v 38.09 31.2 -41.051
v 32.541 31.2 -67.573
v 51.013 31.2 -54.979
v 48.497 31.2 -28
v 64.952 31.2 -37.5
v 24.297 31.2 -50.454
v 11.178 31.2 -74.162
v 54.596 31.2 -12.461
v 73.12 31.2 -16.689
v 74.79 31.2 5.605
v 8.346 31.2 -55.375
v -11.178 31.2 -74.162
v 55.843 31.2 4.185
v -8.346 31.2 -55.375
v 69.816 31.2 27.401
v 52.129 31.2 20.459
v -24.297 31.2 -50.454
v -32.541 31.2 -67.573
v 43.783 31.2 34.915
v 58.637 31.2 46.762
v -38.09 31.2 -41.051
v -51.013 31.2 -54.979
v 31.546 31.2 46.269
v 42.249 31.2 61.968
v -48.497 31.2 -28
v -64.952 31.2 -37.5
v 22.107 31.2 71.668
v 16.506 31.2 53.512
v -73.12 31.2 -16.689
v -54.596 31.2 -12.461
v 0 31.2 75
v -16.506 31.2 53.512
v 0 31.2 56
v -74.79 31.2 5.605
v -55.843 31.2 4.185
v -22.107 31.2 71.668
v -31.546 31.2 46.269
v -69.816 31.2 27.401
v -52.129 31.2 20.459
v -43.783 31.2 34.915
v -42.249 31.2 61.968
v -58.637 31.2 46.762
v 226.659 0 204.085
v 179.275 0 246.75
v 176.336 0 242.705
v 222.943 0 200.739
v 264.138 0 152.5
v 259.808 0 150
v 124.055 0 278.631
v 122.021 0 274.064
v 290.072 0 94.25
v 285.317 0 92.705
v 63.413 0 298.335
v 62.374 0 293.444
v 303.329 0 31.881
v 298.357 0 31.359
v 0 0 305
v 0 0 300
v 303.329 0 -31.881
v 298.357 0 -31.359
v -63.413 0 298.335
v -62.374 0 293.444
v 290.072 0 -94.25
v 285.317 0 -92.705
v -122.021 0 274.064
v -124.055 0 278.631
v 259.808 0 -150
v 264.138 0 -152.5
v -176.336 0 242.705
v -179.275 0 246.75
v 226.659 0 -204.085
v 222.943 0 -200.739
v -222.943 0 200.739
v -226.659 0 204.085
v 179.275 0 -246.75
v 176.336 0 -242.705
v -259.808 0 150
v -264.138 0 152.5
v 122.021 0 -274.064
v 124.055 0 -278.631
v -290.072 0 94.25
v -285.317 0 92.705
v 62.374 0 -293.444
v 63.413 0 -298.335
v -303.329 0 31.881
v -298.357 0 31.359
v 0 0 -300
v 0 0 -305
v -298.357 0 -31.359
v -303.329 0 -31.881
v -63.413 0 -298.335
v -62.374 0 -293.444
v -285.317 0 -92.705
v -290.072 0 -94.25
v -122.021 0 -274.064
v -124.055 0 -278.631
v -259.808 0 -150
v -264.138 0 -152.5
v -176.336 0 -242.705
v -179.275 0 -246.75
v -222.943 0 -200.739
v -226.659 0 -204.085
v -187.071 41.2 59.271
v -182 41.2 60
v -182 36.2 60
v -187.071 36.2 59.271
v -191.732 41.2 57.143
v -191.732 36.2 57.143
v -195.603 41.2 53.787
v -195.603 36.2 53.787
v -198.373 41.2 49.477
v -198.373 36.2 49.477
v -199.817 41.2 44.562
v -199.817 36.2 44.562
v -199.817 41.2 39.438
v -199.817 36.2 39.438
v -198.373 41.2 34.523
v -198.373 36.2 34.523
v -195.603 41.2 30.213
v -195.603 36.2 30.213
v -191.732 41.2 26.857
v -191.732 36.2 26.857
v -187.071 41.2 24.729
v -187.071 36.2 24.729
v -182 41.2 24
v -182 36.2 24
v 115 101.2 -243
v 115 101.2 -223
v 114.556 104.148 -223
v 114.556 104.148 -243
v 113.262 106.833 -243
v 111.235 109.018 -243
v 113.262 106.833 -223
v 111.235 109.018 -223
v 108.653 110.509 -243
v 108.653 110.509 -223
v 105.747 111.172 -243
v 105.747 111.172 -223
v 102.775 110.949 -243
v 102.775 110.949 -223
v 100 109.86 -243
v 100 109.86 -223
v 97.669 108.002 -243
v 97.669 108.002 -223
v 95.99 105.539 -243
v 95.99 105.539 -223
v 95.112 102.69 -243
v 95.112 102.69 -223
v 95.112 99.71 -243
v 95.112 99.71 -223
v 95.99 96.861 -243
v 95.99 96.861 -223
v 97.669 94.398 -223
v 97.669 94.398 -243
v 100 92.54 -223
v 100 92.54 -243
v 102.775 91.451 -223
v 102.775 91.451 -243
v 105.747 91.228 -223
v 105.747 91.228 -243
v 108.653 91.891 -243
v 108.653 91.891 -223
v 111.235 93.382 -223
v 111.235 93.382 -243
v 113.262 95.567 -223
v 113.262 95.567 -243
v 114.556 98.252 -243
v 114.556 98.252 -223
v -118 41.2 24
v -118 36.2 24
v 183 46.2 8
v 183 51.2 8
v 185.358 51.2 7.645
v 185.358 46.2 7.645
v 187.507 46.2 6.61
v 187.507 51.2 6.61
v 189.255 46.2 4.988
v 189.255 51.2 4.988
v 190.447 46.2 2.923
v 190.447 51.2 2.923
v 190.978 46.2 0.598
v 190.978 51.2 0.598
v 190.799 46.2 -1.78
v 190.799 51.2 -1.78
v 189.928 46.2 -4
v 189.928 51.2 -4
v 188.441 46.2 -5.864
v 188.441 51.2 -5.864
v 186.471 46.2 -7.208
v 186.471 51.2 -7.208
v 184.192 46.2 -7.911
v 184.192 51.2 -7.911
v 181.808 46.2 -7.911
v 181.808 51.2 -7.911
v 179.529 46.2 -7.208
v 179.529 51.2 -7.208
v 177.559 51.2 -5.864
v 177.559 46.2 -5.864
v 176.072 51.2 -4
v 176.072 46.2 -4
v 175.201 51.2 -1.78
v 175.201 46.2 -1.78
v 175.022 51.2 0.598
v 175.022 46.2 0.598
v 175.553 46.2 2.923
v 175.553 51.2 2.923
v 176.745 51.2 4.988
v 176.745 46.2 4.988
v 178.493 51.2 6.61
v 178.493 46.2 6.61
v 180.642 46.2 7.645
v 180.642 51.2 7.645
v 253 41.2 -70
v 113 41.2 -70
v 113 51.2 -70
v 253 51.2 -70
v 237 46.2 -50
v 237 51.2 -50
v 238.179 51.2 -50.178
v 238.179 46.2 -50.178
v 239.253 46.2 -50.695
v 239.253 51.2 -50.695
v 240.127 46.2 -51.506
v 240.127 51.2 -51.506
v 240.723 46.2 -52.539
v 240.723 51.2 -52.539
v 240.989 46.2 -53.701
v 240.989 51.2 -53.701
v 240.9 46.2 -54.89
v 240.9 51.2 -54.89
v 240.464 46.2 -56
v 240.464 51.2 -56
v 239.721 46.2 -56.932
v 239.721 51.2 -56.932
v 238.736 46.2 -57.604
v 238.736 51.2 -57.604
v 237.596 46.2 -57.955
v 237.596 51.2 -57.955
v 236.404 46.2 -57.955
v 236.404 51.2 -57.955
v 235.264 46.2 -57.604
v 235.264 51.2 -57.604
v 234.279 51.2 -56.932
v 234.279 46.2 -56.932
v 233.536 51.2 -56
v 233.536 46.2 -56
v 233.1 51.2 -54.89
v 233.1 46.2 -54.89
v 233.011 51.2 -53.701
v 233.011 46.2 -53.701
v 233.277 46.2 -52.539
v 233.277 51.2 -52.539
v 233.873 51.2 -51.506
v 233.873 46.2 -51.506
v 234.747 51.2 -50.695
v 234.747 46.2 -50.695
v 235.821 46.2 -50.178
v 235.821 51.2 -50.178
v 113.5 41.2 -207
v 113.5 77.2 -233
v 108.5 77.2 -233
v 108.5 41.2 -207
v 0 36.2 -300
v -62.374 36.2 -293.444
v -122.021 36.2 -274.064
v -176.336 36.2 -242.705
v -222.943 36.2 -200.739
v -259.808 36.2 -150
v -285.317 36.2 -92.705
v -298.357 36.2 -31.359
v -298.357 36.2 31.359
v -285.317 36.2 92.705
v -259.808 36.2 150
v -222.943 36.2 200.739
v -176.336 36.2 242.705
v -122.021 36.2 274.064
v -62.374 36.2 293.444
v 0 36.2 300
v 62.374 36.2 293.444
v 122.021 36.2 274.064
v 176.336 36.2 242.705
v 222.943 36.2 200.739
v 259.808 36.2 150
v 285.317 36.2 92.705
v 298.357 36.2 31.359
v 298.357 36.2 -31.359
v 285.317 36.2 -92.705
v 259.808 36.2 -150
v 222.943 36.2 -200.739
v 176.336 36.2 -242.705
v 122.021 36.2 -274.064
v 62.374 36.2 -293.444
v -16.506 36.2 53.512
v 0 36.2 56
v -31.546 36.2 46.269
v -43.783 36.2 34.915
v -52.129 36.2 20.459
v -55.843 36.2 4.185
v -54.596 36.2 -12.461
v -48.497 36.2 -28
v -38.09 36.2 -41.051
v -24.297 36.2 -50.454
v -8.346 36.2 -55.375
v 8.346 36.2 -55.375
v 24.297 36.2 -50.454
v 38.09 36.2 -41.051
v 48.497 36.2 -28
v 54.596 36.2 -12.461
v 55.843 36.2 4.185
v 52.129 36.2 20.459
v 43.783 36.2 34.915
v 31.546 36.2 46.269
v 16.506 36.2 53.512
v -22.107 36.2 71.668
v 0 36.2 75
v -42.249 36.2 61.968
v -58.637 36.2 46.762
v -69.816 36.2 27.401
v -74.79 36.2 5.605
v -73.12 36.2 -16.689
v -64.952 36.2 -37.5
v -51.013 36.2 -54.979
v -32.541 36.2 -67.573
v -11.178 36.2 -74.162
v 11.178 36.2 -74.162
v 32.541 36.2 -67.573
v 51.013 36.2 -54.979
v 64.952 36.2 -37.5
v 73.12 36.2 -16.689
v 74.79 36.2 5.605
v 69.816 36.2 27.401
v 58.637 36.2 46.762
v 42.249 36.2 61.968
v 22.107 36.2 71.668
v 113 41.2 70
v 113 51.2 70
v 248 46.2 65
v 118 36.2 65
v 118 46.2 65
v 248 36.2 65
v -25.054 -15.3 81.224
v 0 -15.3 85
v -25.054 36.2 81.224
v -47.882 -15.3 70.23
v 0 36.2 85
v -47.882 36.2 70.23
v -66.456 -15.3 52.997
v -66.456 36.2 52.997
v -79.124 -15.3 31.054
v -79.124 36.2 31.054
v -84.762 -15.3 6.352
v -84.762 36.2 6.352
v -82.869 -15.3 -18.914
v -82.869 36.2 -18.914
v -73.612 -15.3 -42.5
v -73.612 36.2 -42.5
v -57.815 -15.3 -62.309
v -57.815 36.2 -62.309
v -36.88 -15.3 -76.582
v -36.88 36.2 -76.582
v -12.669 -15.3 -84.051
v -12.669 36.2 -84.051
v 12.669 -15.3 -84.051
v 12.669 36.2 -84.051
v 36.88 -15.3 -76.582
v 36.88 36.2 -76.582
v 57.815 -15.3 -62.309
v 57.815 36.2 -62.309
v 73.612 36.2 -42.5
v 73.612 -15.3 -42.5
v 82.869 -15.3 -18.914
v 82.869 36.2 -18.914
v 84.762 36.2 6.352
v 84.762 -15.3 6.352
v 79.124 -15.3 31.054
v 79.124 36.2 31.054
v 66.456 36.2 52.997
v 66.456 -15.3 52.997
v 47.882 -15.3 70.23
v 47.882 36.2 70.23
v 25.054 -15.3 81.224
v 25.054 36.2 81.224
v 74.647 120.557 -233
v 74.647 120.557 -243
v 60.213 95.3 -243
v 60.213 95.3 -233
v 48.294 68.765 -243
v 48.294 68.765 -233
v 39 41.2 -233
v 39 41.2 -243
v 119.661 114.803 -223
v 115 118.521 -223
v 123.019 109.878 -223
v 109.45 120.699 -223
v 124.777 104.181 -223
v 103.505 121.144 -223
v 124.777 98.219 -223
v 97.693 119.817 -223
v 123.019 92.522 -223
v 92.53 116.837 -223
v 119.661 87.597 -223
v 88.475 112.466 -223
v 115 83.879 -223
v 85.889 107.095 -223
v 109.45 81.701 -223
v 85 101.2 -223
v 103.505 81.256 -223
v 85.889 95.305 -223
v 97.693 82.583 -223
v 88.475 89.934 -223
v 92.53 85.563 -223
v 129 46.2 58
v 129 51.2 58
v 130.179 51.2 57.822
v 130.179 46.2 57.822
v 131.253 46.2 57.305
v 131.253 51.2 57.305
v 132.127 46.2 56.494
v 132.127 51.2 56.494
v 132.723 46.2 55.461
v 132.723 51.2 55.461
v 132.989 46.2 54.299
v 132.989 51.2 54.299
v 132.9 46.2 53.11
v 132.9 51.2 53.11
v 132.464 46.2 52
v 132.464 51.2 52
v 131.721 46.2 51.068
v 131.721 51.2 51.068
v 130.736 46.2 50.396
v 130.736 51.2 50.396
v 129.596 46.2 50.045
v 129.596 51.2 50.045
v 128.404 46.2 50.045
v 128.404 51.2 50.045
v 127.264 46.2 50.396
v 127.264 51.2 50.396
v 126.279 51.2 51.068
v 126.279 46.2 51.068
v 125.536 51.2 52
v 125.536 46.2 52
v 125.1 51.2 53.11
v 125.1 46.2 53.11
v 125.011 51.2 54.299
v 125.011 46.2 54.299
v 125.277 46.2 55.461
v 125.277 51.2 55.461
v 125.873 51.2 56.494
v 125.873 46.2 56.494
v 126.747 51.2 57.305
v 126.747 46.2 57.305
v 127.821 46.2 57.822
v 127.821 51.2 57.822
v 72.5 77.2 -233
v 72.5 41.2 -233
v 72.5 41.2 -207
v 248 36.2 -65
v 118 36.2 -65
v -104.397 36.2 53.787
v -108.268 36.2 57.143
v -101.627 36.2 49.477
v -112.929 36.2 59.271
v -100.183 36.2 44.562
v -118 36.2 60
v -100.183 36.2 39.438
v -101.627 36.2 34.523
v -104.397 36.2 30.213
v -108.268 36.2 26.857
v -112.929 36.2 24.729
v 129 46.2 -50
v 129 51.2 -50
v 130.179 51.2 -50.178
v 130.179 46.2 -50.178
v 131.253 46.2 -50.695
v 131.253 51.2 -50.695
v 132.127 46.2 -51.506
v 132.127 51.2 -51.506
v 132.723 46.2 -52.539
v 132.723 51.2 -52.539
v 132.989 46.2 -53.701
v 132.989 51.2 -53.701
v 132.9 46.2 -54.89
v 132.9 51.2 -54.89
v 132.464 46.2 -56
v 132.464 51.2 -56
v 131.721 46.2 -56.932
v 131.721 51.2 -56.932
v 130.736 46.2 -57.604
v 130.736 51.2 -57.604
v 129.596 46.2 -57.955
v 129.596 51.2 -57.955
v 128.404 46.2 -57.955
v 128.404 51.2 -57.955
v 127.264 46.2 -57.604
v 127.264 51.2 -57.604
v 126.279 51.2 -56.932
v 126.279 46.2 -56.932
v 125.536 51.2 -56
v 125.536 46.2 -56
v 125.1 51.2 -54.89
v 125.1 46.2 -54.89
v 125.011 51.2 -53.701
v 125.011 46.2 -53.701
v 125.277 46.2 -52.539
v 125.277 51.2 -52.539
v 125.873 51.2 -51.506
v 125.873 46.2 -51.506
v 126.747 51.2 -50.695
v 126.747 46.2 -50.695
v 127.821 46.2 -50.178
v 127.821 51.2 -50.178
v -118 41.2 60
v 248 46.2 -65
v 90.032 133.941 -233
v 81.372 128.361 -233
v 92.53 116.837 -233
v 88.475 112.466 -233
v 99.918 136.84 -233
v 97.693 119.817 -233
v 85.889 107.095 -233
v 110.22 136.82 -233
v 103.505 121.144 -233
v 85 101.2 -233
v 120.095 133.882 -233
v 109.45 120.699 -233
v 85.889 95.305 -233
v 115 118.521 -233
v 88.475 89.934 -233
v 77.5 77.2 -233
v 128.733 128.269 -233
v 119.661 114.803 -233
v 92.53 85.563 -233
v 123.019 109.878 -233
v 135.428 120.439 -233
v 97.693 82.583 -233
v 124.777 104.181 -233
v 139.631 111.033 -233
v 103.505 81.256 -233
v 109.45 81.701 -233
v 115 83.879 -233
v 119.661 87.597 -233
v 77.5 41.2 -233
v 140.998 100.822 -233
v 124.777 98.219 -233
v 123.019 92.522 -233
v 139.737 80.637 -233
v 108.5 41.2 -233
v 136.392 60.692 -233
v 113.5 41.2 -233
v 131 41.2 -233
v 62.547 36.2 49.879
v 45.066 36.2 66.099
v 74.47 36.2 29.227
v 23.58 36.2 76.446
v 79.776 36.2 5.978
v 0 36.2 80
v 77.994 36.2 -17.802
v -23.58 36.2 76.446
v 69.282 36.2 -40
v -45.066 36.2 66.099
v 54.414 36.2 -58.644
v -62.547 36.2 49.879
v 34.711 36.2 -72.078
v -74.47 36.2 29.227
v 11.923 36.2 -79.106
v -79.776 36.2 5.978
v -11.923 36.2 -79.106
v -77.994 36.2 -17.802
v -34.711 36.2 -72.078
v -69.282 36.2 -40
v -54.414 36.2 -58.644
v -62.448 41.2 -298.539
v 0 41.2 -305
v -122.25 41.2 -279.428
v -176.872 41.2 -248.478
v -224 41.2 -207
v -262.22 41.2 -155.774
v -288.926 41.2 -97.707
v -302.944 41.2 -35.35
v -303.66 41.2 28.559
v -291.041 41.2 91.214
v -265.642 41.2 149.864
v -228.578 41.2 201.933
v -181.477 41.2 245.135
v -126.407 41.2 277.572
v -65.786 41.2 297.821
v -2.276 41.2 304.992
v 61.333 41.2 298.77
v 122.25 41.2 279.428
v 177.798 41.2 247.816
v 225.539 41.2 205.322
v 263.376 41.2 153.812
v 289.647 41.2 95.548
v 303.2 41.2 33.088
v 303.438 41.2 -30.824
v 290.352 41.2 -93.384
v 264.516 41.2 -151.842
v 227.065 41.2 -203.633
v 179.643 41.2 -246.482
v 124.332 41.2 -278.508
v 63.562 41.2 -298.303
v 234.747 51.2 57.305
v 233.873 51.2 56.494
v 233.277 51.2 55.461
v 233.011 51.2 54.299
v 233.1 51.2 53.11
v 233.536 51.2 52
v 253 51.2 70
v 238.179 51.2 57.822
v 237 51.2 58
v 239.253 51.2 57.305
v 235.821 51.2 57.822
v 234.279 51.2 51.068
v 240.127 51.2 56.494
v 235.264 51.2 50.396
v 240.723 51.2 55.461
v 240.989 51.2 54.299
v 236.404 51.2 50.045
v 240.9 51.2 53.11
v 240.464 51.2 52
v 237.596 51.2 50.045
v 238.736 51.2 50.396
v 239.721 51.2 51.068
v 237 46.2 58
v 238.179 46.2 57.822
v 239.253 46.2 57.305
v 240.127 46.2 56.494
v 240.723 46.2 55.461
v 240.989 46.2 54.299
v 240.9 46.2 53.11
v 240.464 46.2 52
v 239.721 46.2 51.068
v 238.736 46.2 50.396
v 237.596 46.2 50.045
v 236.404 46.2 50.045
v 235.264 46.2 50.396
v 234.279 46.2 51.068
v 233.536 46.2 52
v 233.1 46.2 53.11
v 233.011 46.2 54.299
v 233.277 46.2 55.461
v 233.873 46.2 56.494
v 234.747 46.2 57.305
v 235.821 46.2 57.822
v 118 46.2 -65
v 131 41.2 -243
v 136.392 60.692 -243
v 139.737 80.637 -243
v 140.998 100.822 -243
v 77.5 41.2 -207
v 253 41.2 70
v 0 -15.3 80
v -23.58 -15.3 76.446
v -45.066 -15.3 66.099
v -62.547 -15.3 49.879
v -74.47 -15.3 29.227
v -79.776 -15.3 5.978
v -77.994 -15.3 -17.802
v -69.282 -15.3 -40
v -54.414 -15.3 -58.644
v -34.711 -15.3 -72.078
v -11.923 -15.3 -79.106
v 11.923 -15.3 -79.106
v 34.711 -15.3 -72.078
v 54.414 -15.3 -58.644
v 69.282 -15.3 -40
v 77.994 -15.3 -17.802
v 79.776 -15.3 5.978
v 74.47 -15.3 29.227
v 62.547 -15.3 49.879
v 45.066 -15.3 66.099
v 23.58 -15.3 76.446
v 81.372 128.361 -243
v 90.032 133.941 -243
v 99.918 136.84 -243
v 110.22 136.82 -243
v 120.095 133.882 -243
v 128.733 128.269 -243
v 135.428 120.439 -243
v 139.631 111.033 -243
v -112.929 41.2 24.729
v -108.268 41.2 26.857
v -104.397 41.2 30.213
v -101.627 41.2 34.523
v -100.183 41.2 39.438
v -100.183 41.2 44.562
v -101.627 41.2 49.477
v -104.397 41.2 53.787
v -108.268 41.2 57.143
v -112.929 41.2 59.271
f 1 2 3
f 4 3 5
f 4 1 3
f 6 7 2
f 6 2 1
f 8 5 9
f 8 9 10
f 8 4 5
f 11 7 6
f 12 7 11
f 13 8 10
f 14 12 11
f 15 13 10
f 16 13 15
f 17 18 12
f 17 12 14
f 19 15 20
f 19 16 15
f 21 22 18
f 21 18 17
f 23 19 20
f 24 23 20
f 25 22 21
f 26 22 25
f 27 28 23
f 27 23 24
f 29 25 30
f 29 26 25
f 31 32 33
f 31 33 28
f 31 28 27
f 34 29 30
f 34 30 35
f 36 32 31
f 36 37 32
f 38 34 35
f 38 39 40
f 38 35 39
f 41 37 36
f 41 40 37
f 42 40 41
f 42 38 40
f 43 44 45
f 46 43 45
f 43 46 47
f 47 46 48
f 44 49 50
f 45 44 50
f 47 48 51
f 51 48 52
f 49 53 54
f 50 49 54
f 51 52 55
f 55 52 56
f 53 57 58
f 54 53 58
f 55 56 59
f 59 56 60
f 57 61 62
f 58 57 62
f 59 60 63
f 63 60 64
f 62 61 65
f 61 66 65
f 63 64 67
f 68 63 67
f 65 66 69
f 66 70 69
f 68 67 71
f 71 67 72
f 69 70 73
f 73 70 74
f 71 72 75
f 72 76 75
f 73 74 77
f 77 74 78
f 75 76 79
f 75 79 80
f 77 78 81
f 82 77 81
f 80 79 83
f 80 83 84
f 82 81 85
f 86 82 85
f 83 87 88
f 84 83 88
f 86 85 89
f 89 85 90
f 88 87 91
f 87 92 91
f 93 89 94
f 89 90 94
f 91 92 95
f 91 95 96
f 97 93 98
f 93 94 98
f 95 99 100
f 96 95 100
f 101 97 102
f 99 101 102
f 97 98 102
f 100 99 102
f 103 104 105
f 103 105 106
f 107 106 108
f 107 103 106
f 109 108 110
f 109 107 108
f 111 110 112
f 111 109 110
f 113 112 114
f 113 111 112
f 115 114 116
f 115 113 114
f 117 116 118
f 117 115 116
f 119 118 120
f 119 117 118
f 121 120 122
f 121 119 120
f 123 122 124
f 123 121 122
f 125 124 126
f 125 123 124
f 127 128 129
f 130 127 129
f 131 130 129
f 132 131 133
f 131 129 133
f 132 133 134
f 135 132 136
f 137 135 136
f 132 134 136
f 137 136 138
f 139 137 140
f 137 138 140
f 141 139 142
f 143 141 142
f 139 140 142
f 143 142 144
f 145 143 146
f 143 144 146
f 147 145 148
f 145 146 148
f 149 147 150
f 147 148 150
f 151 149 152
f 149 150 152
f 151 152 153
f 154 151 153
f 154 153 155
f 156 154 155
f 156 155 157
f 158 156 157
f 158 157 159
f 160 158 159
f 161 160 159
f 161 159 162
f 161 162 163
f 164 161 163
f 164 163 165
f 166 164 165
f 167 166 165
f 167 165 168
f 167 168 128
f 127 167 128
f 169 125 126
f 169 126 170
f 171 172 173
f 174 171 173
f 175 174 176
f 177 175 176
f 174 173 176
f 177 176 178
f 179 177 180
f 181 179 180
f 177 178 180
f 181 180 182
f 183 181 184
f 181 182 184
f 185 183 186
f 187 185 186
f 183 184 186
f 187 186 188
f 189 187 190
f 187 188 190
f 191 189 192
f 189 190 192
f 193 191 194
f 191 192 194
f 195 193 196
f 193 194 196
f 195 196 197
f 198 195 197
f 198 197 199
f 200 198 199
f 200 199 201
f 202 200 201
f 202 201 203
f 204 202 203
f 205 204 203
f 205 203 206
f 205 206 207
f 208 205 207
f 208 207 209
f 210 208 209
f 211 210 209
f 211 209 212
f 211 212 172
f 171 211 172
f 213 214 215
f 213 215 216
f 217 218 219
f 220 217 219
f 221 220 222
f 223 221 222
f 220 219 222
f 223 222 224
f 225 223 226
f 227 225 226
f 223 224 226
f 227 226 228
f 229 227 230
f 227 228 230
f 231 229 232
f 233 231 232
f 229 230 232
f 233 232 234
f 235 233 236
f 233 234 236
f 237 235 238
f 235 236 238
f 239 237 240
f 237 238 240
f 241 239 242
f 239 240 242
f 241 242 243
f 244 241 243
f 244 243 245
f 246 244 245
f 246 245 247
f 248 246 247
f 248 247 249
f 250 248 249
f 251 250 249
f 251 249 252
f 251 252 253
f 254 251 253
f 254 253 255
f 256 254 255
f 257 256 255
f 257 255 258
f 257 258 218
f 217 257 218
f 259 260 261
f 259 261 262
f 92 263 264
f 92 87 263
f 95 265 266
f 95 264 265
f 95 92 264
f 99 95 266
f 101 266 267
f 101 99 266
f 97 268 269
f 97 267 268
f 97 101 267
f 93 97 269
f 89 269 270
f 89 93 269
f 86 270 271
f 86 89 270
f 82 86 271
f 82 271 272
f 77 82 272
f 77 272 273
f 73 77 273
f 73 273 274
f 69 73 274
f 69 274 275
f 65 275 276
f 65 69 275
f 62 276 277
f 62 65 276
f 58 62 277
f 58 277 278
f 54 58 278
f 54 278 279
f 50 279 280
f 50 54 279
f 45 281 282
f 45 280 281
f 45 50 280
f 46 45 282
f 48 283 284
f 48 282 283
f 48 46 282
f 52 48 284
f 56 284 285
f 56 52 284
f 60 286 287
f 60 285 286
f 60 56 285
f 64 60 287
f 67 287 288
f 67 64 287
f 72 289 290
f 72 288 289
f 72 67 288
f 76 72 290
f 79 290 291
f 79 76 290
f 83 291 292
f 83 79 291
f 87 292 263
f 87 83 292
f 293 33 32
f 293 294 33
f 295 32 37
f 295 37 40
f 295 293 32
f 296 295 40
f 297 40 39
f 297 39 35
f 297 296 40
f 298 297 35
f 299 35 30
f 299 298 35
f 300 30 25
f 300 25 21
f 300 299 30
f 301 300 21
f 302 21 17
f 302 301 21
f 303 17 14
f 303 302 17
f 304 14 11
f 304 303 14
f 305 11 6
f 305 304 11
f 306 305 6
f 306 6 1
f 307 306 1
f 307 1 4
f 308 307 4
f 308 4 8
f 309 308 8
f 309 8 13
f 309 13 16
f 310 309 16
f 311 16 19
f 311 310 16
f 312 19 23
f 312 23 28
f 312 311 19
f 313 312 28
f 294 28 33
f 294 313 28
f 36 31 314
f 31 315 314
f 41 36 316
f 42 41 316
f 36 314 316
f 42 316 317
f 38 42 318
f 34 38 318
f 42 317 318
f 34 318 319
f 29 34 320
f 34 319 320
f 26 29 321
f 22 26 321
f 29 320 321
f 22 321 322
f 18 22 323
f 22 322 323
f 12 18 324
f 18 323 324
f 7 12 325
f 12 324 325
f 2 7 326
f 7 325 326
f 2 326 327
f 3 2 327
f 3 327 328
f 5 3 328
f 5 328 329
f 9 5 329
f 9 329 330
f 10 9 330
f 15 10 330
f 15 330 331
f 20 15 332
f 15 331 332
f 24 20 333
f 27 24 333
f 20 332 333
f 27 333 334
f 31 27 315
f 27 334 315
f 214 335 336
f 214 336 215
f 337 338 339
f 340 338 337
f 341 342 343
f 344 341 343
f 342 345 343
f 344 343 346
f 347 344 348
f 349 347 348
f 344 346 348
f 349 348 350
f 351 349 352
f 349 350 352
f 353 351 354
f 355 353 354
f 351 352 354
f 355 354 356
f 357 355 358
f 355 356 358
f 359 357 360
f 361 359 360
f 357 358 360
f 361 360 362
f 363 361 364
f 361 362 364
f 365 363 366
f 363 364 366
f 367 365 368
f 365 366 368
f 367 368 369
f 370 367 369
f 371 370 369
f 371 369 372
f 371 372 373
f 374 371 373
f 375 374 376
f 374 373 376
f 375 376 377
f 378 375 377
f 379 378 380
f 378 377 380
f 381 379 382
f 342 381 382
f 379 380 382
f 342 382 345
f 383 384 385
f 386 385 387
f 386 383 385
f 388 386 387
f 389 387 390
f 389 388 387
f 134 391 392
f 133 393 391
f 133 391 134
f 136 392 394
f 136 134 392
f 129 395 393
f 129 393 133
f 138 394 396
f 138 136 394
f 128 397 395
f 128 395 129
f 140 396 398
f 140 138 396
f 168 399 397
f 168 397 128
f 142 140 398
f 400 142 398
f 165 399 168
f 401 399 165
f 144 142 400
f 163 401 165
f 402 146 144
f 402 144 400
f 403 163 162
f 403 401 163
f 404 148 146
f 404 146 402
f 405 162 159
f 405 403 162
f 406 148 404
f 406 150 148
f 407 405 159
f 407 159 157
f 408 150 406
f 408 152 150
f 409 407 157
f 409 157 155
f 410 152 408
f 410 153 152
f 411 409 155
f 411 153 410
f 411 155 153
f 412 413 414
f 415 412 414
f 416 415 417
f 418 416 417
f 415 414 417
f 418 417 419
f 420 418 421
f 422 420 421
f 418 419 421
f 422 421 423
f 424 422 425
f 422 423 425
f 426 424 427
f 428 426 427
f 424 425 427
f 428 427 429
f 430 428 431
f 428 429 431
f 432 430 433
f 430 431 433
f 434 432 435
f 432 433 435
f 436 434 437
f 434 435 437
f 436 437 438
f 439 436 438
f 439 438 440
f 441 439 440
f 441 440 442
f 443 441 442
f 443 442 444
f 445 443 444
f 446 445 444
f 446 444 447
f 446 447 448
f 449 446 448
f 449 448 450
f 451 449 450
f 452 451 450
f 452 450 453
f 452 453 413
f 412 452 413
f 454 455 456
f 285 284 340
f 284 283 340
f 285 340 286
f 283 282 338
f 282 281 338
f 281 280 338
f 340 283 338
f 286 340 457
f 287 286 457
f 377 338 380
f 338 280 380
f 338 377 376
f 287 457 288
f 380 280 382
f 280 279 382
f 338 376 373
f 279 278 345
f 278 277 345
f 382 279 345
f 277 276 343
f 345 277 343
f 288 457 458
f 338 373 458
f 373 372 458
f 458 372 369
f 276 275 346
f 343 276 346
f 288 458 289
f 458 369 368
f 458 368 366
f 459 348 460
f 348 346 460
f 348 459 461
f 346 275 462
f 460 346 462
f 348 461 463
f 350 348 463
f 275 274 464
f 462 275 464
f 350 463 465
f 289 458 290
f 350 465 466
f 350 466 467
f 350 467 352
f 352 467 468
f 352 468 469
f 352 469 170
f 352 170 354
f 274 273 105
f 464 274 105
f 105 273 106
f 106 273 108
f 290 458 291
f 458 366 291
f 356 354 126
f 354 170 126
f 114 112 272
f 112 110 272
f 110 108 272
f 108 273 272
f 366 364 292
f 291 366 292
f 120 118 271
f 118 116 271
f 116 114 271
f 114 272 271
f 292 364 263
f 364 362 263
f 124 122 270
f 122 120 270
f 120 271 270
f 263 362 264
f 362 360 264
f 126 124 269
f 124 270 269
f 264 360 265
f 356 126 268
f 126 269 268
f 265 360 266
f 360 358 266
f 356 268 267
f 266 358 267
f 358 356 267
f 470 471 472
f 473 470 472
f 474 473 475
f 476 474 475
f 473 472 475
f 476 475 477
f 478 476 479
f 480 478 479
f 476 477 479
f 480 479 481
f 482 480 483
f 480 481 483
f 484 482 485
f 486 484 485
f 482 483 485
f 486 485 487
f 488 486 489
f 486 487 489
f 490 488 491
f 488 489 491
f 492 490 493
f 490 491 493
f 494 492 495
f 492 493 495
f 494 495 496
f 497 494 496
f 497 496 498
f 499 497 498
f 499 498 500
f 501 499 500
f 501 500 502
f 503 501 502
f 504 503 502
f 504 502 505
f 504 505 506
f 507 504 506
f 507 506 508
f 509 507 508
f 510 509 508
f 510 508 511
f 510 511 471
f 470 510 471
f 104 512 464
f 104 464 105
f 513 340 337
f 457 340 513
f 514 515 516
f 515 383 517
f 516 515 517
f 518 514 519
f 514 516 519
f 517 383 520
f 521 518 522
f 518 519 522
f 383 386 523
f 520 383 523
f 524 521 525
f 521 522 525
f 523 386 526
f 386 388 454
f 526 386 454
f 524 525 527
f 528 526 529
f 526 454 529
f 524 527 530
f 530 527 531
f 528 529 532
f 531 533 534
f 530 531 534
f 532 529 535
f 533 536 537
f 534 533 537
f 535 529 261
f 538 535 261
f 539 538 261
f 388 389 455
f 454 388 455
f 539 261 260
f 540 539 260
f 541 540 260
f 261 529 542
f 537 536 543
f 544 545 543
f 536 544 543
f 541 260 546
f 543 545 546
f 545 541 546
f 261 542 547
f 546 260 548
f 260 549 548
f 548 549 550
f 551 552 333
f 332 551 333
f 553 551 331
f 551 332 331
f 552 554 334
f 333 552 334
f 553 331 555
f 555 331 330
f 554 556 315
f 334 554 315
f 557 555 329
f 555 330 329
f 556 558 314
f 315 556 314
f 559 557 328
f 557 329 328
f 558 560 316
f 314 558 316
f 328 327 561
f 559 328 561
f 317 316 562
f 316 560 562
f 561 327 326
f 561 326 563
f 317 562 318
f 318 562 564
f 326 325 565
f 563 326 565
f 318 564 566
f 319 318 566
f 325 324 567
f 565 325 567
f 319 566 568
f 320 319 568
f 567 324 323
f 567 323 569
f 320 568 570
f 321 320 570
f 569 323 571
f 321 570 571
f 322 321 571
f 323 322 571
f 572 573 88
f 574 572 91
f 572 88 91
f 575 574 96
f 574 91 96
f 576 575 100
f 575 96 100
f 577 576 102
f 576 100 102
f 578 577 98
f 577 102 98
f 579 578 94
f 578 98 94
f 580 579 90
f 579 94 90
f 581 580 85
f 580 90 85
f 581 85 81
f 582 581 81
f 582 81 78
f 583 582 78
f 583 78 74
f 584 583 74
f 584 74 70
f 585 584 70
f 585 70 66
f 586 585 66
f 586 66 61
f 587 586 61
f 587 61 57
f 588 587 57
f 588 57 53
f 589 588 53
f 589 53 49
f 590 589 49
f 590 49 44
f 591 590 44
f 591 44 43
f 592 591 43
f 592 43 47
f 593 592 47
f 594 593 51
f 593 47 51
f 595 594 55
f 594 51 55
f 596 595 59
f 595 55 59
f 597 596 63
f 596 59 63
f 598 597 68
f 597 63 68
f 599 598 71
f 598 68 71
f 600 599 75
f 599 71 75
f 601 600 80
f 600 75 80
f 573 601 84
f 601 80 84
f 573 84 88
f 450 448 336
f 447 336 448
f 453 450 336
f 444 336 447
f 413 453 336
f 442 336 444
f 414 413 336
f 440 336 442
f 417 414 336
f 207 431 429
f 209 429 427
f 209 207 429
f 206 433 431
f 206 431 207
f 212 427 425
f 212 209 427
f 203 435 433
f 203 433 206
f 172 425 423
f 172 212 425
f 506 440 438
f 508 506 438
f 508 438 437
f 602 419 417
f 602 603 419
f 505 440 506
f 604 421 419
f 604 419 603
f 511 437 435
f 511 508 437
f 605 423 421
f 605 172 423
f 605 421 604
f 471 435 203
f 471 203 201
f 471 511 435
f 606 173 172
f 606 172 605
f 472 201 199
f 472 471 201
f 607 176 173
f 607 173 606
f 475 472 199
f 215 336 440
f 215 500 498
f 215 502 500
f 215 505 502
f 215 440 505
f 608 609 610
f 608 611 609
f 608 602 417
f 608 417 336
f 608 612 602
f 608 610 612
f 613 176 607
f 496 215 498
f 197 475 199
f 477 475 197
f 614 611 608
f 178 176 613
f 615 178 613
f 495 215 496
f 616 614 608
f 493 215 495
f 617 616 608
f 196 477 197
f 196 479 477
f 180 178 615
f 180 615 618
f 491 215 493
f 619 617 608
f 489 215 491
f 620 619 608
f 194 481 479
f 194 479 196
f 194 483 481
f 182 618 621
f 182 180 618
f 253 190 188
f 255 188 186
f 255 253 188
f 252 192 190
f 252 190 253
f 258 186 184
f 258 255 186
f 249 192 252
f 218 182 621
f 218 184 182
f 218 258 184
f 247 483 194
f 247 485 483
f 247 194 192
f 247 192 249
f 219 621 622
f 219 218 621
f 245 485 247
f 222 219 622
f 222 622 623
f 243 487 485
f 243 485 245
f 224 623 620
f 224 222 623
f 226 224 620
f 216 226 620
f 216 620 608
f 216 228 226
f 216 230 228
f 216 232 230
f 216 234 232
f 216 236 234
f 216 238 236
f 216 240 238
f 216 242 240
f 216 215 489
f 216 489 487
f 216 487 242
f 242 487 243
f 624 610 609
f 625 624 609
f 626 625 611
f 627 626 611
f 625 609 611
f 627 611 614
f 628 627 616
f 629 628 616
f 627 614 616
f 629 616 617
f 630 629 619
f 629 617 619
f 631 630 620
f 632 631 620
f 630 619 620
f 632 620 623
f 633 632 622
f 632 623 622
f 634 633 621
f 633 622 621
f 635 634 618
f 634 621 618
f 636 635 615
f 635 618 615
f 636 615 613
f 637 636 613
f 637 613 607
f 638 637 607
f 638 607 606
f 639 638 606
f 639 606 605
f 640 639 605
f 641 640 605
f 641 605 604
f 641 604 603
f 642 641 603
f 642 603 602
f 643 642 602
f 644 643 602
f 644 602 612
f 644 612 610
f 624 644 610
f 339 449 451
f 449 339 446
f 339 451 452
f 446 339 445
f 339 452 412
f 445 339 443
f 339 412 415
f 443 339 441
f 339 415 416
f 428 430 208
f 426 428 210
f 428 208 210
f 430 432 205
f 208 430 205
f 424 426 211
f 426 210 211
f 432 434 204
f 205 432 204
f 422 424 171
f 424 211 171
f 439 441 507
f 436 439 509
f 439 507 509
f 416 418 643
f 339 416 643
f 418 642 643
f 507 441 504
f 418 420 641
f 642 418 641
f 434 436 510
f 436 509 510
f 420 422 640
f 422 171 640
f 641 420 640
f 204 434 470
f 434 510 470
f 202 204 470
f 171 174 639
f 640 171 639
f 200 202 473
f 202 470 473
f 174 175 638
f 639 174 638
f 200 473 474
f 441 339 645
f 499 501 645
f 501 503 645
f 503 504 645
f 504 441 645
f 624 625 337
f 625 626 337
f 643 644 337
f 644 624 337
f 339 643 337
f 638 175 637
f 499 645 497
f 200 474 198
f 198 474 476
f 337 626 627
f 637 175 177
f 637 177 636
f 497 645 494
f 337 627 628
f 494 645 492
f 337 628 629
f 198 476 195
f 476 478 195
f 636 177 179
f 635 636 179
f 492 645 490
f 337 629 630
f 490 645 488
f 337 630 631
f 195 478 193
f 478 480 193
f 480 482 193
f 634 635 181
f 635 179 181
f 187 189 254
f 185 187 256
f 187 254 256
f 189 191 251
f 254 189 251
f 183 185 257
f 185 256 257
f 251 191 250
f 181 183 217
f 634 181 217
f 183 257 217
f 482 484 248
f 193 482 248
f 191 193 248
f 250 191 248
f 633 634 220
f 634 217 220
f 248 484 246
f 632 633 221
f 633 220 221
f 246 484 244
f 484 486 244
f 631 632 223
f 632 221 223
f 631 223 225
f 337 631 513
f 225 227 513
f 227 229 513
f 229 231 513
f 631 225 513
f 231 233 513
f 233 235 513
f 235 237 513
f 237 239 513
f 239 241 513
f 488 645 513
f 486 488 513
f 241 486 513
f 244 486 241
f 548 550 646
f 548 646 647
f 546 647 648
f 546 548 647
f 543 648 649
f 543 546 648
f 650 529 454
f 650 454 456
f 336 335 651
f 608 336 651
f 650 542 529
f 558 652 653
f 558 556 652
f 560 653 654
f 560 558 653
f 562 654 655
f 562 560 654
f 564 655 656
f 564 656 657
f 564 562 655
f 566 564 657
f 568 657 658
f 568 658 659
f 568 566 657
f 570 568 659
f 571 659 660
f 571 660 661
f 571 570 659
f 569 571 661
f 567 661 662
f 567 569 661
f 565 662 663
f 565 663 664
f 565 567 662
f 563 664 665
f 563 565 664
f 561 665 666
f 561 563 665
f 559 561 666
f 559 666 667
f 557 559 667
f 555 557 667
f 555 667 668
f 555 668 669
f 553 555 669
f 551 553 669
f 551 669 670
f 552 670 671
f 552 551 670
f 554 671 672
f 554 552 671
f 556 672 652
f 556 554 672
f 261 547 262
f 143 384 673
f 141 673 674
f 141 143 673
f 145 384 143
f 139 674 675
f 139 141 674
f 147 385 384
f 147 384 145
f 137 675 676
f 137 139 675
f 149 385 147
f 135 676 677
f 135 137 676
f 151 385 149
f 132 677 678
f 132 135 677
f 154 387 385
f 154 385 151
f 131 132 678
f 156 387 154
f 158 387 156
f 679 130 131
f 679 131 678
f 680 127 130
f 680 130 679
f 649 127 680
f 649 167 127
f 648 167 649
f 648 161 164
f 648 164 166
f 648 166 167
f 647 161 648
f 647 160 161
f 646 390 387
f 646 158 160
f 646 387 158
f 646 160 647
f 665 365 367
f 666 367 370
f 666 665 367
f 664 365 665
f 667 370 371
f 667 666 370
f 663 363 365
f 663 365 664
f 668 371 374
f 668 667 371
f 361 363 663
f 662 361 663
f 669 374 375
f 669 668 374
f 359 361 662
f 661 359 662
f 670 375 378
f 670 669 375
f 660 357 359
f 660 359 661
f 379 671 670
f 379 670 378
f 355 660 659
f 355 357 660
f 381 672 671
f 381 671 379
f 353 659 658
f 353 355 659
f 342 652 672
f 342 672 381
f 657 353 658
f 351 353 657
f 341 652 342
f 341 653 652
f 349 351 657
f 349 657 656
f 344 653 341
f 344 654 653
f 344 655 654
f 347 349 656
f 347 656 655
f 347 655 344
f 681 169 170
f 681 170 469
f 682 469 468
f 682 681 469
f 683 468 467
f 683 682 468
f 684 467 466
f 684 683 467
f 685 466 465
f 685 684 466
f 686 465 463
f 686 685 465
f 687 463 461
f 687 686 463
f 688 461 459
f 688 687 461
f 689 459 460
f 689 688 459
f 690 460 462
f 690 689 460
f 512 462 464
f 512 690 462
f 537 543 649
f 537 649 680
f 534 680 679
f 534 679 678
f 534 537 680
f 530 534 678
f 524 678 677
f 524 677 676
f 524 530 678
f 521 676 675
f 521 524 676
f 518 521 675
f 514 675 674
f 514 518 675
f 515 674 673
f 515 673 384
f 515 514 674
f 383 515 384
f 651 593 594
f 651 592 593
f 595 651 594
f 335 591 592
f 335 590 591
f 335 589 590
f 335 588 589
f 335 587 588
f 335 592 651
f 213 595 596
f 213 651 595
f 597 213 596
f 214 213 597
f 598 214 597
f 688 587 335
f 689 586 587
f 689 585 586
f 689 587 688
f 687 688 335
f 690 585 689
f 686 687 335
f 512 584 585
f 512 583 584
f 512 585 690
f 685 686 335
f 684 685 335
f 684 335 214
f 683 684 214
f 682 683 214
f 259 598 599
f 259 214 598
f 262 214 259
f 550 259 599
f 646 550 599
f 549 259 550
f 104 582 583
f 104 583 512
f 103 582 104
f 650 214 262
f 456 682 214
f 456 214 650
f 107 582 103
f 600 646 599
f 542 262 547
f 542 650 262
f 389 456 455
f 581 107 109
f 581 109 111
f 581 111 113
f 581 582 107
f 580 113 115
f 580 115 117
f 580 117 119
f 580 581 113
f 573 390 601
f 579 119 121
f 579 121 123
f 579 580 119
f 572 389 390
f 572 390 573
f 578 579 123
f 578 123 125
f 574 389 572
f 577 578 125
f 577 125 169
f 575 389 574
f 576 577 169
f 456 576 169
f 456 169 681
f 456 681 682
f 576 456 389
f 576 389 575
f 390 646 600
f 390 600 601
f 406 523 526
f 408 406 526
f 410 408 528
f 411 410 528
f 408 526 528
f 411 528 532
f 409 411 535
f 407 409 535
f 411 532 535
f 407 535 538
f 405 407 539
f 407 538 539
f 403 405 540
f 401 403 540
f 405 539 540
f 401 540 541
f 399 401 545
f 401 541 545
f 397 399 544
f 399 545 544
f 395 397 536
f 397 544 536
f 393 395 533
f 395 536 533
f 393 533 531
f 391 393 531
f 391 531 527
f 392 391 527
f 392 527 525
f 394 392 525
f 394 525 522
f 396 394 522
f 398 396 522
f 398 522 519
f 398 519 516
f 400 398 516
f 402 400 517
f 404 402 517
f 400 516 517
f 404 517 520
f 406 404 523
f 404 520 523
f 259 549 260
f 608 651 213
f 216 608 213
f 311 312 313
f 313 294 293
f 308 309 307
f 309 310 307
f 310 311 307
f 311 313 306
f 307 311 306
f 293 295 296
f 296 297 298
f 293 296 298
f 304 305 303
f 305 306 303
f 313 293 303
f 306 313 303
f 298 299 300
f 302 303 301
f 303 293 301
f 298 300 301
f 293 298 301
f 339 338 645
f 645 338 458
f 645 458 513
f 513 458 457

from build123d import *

# Parameters (mm, degrees)
SKETCH_1_R           = 305
EXTRUDE_1_DEPTH      = 41.2
SKETCH_4_W           = 140
SKETCH_4_H           = 140
EXTRUDE_2_DEPTH      = 10
SHELL_1_T            = -5
CUT_EXTRUDE_3_DEPTH  = 434.298326791
SKETCH_5_R           = 8
SKETCH_5_R_2         = 4
CUT_EXTRUDE_6_DEPTH  = 435.363258115
SKETCH_11_W          = 130
SKETCH_11_H          = 10
EXTRUDE_3_DEPTH      = 200
CUT_EXTRUDE_8_DEPTH  = 664.812051713
SKETCH_14_R          = 20
EXTRUDE_4_DEPTH      = 10
SKETCH_16_R          = 10
CUT_EXTRUDE_10_DEPTH = 626.006271969
SKETCH_19_W          = 5
SKETCH_19_H          = 36
EXTRUDE_5_DEPTH      = 26
CUT_EXTRUDE_11_DEPTH = 536.715493522
SKETCH_21_W          = 19
SKETCH_21_H          = 5
SKETCH_21_W_2        = 5
SKETCH_21_H_2        = 51.5


with BuildPart() as part:
    # 草图1 → 凸台-拉伸1 (new body)
    with BuildSketch(Plane(origin=(0, 0, 0), x_dir=(1, 0, 0), z_dir=(0, 1, 0))):
        with Locations(Location((0, 0, 0), (0, 0, 90))):
            Circle(SKETCH_1_R)
    extrude(amount=EXTRUDE_1_DEPTH)

    # 草图4 → 凸台-拉伸2 (add)
    with BuildSketch(Plane(origin=(0, 41.2, 0), x_dir=(1, 0, 0), z_dir=(0, 1, 0))):
        with Locations((183, 0)):
            Rectangle(SKETCH_4_W, SKETCH_4_H)
    extrude(amount=EXTRUDE_2_DEPTH)

    # 抽壳1
    shell_1_openings = [part.faces().sort_by_distance(p)[0] for p in [
        (0, 0, 0),
    ]]
    offset(amount=SHELL_1_T, openings=shell_1_openings, kind=Kind.INTERSECTION)

    # 草图2 → 切除-拉伸3 (cut, through all)
    with BuildSketch(Plane(origin=(0, 41.2, 0), x_dir=(1, 0, 0), z_dir=(0, 1, 0))):
        with BuildLine():
            Line((-182, -24), (-118, -24))
            ThreePointArc((-118, -24), (-100, -42), (-118, -60))
            Line((-118, -60), (-182, -60))
            ThreePointArc((-182, -60), (-200, -42), (-182, -24))
        make_face()
    extrude(amount=-CUT_EXTRUDE_3_DEPTH, mode=Mode.SUBTRACT)

    # 草图5 → 切除-拉伸6 (cut, through all)
    with BuildSketch(Plane(origin=(0, 51.2, 0), x_dir=(1, 0, 0), z_dir=(0, 1, 0))):
        with Locations(Location((183, 0, 0), (0, 0, 270))):
            Circle(SKETCH_5_R)
        with Locations(Location((129, 54, 0), (0, 0, 270))):
            Circle(SKETCH_5_R_2)
        with Locations(Location((237, 54, 0), (0, 0, 270))):
            Circle(SKETCH_5_R_2)
        with Locations(Location((237, -54, 0), (0, 0, 270))):
            Circle(SKETCH_5_R_2)
        with Locations(Location((129, -54, 0), (0, 0, 270))):
            Circle(SKETCH_5_R_2)
    extrude(amount=-CUT_EXTRUDE_6_DEPTH, mode=Mode.SUBTRACT)

    # 草图11 → 凸台-拉伸3 (add)
    with BuildSketch(Plane(origin=(0, 41.2, 0), x_dir=(1, 0, 0), z_dir=(0, 1, 0))):
        with Locations((104, 238)):
            Rectangle(SKETCH_11_W, SKETCH_11_H)
    extrude(amount=EXTRUDE_3_DEPTH)

    # 草图13 → 切除-拉伸8 (cut, through all)
    with BuildSketch(Plane.XY.offset(-233)):
        with BuildLine():
            Line((39, 41.2), (39, 241.2))
            Line((39, 241.2), (169, 241.2))
            Line((169, 241.2), (169, 41.2))
            Line((169, 41.2), (131, 41.2))
            ThreePointArc((131, 41.2), (138.32356193, 70.621084147), (140.99801314, 100.821780537))
            ThreePointArc((140.99801314, 100.821780537), (115.26317996, 135.706044936), (74.646786984, 120.556716136))
            ThreePointArc((74.646786984, 120.556716136), (53.931588882, 82.177347592), (39, 41.2))
        make_face()
    extrude(amount=-CUT_EXTRUDE_8_DEPTH, mode=Mode.SUBTRACT)

    # 草图14 → 凸台-拉伸4 (add)
    with BuildSketch(Plane.XY.offset(-233)):
        with Locations(Location((105, 101.2, 0), (0, 0, 180))):
            Circle(SKETCH_14_R)
    extrude(amount=EXTRUDE_4_DEPTH)

    # 草图16 → 切除-拉伸10 (cut, through all)
    with BuildSketch(Plane.XY.offset(-223)):
        with Locations((105, 101.2)):
            Circle(SKETCH_16_R)
    extrude(amount=-CUT_EXTRUDE_10_DEPTH, mode=Mode.SUBTRACT)

    # 草图19 → 凸台-拉伸5 (add)
    with BuildSketch(Plane.XY.offset(-233)):
        with Locations((75, 59.2)):
            Rectangle(SKETCH_19_W, SKETCH_19_H)
        with Locations((111, 59.2)):
            Rectangle(SKETCH_19_W, SKETCH_19_H)
    extrude(amount=EXTRUDE_5_DEPTH)

    # 草图20 → 切除-拉伸11 (cut, through all)
    with BuildSketch(Plane(origin=(113.5, 0, 0), x_dir=(0, 0, -1), z_dir=(1, 0, 0))):
        Polygon((233, 77.2), (207, 41.2), (207, 77.2), align=None)
    extrude(amount=-CUT_EXTRUDE_11_DEPTH, mode=Mode.SUBTRACT)

    # 草图21 → 旋转2 (revolve)
    with BuildSketch(Plane.XY, mode=Mode.PRIVATE) as revolve_2_sk:
        with Locations((-65.5, 33.7)):
            Rectangle(SKETCH_21_W, SKETCH_21_H)
        with Locations((-82.5, 10.45)):
            Rectangle(SKETCH_21_W_2, SKETCH_21_H_2)
    revolve(revolve_2_sk.sketch.rotate(Axis((0, 0, 0), (0, -1, 0)), 270), axis=Axis((0, 0, 0), (0, -1, 0)))


solid = part.part
